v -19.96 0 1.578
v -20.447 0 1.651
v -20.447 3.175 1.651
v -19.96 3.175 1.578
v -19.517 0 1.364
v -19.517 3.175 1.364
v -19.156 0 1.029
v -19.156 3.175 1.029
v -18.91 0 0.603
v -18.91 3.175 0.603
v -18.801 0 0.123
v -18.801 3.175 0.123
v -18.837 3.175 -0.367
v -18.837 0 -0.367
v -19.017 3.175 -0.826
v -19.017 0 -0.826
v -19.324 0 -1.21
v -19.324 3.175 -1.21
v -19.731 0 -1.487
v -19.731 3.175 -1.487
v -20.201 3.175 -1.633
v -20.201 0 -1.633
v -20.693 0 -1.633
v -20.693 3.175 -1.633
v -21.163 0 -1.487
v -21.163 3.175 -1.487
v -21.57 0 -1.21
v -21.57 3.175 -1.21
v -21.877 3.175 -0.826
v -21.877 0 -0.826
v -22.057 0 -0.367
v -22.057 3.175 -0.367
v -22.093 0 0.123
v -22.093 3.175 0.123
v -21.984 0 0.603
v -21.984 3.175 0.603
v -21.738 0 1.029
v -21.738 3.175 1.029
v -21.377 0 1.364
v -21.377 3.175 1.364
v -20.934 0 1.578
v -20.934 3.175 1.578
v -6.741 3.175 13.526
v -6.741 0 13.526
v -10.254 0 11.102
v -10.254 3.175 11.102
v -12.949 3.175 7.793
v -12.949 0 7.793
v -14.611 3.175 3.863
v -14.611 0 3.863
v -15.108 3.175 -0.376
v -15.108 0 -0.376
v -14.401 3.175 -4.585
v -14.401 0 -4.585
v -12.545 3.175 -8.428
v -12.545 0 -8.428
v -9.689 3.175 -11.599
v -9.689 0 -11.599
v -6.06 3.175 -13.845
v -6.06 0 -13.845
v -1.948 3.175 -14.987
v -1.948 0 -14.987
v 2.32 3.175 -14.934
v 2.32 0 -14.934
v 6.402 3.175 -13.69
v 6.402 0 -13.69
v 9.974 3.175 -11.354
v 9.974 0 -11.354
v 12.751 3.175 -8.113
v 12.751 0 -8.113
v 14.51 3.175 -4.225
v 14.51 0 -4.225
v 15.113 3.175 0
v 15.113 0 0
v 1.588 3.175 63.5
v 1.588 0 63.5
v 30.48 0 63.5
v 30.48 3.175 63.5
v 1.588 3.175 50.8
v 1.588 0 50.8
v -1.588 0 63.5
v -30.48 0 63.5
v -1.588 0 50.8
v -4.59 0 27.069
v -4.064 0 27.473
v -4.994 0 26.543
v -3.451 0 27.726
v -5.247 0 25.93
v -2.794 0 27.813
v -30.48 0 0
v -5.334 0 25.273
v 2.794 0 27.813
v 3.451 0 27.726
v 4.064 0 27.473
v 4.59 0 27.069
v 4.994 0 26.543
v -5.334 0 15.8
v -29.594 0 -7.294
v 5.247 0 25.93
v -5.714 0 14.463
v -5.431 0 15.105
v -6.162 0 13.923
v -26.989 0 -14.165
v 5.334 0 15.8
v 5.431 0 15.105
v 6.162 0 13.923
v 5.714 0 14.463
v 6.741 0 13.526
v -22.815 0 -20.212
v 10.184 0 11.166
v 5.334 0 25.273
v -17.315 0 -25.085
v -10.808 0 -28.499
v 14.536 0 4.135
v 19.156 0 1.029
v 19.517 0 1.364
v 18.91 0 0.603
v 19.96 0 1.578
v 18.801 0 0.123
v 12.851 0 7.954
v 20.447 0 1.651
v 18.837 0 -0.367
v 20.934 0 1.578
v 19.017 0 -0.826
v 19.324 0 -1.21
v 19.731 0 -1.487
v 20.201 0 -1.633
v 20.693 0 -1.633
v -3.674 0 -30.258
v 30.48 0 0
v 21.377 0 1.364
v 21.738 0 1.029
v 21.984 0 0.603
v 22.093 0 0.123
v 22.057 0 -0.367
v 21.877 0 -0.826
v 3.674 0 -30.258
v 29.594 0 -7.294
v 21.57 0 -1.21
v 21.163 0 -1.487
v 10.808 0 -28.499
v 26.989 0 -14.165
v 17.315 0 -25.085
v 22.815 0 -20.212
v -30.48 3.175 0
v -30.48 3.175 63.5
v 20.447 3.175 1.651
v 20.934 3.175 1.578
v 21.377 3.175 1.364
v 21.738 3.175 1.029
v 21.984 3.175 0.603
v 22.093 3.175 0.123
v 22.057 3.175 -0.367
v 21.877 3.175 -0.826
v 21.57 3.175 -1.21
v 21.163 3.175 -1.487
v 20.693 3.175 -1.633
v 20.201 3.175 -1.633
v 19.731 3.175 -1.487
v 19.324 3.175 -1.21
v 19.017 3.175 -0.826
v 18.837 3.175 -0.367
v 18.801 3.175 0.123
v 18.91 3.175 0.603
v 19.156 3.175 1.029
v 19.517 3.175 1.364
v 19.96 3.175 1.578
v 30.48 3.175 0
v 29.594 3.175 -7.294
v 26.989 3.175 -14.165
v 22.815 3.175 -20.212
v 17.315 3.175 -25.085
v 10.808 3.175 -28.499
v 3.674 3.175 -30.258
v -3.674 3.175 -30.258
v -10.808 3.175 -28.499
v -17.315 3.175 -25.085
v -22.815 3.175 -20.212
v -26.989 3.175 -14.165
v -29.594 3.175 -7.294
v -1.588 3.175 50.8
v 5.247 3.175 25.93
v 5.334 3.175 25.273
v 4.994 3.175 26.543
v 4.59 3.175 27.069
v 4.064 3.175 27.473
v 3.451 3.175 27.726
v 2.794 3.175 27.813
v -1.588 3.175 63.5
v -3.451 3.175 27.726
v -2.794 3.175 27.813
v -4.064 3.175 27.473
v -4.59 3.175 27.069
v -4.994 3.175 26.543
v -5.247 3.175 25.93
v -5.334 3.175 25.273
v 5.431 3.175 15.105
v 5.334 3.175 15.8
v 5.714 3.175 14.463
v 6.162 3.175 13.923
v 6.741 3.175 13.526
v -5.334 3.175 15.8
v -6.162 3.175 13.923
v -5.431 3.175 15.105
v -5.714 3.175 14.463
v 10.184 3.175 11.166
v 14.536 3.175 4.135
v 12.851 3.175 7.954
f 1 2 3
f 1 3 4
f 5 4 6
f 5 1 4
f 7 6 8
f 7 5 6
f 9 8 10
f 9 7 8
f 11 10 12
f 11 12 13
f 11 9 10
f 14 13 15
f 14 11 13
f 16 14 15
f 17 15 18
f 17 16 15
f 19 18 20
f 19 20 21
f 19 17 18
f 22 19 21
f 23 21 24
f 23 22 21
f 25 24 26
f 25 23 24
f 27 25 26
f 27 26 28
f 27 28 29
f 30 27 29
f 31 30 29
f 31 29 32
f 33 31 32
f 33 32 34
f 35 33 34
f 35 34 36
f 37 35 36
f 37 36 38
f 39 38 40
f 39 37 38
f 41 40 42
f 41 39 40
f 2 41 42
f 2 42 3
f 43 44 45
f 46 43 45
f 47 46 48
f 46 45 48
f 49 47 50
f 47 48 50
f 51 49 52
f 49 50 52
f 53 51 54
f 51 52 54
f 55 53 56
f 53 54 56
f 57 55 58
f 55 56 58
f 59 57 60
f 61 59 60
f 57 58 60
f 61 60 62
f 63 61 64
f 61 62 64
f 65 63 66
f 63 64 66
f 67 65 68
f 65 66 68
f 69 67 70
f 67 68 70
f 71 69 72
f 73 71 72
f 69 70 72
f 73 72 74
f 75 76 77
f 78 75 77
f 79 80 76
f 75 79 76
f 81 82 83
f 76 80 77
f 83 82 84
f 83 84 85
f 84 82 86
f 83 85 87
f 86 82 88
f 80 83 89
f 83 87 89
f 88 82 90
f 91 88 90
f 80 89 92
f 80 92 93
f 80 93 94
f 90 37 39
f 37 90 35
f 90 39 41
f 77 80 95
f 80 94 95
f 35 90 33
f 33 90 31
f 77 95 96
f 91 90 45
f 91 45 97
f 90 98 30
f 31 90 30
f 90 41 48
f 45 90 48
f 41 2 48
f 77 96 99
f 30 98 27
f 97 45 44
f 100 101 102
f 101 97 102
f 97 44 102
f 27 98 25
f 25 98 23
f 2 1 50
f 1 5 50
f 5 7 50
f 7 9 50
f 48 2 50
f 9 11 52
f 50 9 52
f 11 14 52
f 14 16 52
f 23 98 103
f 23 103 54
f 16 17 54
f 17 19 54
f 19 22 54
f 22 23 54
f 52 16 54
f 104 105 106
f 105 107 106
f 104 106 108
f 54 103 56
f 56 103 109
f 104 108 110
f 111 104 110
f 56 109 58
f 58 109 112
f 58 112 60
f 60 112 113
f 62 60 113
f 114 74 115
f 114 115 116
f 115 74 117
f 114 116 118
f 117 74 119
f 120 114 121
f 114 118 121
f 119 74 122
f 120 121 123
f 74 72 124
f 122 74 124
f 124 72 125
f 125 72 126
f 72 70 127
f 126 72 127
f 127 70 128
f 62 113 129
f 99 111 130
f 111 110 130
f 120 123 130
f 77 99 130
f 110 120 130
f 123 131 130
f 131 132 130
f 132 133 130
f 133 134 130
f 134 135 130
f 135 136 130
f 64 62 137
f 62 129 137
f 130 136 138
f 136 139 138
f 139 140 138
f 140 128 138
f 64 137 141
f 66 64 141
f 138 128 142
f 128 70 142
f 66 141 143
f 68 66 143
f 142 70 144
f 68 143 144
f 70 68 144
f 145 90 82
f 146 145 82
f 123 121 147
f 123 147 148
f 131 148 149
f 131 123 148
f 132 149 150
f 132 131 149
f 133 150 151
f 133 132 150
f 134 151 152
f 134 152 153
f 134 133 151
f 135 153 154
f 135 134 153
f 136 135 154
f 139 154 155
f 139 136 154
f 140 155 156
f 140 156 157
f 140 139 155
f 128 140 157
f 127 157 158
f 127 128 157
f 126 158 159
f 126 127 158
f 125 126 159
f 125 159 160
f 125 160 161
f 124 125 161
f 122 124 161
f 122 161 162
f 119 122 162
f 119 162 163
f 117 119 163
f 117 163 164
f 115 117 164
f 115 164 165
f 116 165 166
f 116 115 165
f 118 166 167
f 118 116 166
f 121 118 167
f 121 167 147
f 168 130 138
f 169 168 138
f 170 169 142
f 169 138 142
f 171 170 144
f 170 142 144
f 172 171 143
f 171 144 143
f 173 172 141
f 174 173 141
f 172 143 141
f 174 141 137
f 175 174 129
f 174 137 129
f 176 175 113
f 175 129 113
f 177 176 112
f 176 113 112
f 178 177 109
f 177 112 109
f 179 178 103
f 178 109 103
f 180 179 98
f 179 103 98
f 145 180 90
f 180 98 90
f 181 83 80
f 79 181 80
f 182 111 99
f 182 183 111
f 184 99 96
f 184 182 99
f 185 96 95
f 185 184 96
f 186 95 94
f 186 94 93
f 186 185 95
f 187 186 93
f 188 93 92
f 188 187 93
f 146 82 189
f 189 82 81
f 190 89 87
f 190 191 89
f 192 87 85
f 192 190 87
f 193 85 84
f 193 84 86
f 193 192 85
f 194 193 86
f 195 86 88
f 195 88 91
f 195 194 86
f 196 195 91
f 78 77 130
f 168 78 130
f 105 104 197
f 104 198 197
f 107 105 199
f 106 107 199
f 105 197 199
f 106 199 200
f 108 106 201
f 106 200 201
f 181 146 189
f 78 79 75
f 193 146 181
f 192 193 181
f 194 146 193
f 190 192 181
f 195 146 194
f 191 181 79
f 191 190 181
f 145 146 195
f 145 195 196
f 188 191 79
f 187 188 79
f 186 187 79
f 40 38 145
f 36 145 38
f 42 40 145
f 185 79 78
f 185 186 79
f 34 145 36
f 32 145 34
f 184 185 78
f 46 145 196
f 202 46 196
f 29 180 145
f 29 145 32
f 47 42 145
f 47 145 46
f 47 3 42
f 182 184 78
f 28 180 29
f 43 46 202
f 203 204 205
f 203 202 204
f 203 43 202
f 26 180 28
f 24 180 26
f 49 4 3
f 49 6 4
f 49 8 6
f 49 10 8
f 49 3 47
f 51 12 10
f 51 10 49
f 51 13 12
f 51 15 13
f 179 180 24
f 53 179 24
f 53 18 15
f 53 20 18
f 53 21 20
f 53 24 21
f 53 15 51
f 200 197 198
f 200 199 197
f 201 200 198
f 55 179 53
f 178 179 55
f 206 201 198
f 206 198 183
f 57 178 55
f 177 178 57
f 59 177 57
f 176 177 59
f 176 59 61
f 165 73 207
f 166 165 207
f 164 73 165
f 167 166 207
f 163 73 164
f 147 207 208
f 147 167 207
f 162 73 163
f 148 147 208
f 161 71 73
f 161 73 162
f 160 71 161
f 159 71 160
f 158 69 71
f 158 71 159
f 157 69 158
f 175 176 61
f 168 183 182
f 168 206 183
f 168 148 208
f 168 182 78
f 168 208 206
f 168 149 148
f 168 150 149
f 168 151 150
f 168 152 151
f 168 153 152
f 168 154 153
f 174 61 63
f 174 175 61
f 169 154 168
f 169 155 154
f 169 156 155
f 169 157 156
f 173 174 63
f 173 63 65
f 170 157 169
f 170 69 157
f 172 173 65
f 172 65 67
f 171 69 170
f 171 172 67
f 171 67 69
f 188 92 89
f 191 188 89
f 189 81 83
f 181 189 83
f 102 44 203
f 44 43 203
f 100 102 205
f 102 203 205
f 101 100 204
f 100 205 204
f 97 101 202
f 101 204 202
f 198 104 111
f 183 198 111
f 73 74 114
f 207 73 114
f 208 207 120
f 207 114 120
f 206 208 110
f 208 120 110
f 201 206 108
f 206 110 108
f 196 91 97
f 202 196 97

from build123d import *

# Parameters (mm, degrees)
SKETCH1_R           = 1.651
BOSS_EXTRUDE1_DEPTH = 3.175
FILLET2_R           = 2.54


with BuildPart() as part:
    # Sketch1 → Boss-Extrude1 (new body)
    with BuildSketch(Plane(origin=(0, 0, 0), x_dir=(1, 0, 0), z_dir=(0, 1, 0))):
        with BuildLine():
            Line((30.48, -63.5), (30.48, 0))
            ThreePointArc((30.48, 0), (0, 30.48), (-30.48, 0))
            Line((-30.48, 0), (-30.48, -63.5))
            Line((-30.48, -63.5), (-1.5875, -63.5))
            Line((-1.5875, -63.5), (-1.5875, -50.8))
            Line((-1.5875, -50.8), (1.5875, -50.8))
            Line((1.5875, -50.8), (1.5875, -63.5))
            Line((1.5875, -63.5), (30.48, -63.5))
        make_face()
        with Locations(Location((-20.447, 0, 0), (0, 0, 270))):
            Circle(SKETCH1_R, mode=Mode.SUBTRACT)
        with BuildLine():
            Line((5.334, -27.813), (-5.334, -27.813))
            Line((-5.334, -27.813), (-5.334, -14.140410638))
            ThreePointArc((-5.334, -14.140410638), (-8.596220885, 12.430114863), (15.113, 0))
            ThreePointArc((15.113, 0), (12.430114863, -8.596220885), (5.334, -14.140410638))
            Line((5.334, -14.140410638), (5.334, -27.813))
        make_face(mode=Mode.SUBTRACT)
        with Locations(Location((20.447, 0, 0), (0, 0, 270))):
            Circle(SKETCH1_R, mode=Mode.SUBTRACT)
    extrude(amount=BOSS_EXTRUDE1_DEPTH)

    # Fillet2
    fillet2_edges = [part.edges().sort_by_distance(p)[0] for p in [
        (-5.334, 1.5875, 14.140410638),
        (-5.334, 1.5875, 27.813),
        (5.334, 1.5875, 27.813),
        (5.334, 1.5875, 14.140410638),
    ]]
    fillet(fillet2_edges, radius=FILLET2_R)


solid = part.part
